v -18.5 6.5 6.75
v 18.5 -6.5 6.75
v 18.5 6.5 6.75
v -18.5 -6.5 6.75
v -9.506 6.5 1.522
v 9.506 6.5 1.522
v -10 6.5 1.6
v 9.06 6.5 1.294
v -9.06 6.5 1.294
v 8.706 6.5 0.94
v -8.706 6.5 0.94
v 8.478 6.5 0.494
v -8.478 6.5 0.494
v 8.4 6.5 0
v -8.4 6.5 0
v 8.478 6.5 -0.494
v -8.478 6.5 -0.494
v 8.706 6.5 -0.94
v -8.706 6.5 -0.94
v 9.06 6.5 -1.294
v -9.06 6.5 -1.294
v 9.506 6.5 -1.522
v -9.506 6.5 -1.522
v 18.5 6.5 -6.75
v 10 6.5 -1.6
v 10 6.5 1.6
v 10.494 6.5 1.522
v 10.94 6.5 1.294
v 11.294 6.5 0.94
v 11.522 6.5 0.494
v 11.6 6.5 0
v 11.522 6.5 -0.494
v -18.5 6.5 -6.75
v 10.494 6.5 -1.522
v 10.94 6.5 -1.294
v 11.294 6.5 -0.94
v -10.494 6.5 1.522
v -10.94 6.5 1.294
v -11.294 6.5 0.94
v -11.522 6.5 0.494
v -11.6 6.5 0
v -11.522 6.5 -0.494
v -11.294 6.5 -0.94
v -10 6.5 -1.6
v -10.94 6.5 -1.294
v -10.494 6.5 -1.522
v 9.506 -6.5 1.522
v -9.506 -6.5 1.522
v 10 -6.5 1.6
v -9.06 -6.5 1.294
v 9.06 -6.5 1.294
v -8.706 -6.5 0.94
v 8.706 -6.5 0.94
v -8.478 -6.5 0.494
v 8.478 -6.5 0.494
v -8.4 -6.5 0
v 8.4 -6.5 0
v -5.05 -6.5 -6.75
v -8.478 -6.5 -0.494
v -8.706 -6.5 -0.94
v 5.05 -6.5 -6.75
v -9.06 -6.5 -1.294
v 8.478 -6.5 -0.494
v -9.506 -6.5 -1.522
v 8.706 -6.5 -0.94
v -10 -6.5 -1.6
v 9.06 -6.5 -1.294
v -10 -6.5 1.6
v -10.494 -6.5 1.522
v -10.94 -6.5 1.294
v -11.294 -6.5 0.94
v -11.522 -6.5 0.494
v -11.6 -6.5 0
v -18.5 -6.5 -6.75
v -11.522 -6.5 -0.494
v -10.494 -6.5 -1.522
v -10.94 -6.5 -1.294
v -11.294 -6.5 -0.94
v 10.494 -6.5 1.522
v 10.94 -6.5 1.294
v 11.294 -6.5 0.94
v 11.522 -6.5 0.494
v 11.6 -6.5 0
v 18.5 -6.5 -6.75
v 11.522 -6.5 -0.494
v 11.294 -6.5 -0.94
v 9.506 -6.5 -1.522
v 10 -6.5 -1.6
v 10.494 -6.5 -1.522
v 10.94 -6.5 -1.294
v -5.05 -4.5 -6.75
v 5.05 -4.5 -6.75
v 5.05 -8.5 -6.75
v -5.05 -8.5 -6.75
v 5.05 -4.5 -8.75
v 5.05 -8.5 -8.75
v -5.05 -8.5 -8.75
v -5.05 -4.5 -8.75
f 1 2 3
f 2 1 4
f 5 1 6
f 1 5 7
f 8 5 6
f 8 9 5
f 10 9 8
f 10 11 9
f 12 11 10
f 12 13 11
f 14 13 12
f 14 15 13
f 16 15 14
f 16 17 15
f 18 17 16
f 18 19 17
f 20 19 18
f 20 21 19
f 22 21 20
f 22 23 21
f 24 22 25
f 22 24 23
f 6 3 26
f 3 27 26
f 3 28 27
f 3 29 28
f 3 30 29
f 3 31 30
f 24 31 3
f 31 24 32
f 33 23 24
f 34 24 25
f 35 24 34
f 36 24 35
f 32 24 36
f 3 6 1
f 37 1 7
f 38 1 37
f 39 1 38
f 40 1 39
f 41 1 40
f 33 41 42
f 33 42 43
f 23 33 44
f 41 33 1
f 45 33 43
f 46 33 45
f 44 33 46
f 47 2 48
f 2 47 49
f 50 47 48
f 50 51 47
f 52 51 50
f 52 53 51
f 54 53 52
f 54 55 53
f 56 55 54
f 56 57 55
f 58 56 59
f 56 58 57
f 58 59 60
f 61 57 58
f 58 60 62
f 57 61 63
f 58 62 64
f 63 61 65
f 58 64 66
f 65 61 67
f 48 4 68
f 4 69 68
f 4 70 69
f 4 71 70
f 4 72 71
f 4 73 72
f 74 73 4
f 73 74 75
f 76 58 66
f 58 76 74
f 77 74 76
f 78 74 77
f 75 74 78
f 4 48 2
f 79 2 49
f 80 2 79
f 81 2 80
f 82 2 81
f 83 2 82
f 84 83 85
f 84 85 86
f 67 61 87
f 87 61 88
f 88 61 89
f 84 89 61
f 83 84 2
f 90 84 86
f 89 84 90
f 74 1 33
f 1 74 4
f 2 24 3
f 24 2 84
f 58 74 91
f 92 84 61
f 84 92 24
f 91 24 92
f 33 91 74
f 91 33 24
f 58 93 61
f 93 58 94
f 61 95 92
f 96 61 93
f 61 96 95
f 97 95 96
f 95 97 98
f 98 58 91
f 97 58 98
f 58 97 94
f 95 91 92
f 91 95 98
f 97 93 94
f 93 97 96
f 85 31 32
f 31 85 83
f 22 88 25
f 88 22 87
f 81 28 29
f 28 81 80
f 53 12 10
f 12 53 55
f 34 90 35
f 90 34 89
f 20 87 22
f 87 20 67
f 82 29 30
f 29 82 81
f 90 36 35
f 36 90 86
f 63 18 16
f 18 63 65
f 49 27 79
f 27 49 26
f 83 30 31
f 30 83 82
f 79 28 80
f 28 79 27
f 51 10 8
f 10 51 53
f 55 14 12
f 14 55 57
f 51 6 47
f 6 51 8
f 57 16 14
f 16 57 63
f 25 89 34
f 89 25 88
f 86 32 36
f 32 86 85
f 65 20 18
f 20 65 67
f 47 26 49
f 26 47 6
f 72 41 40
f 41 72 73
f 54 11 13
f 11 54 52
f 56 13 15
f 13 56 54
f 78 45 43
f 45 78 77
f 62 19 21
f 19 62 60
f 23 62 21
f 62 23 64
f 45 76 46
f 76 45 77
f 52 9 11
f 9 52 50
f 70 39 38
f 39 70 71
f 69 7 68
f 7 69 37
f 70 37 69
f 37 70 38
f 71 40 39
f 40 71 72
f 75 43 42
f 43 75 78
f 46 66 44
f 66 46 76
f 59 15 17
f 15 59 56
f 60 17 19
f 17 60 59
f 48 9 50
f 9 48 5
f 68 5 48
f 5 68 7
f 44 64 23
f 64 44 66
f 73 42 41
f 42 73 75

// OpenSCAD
// Sharp GP2Y0A21YK0F Distance Sensor Model
// Units: mm

// --- Parameters ---
body_width = 29.5;
total_width = 37.0;
body_depth = 13.0; // Estimated from side view
total_height = 13.5;
pwb_thickness = 1.2;
hole_dist = 20.0;
hole_dia = 3.2;
lens_case_width = 6.3;
lens_dist = 12.0; // Estimated distance between lens centers
connector_width = 10.1;

// Coordinate adjustment: Center of the body is origin
// Z-axis: PWB surface is at -total_height/2
z_offset = total_height / 2;

module gp2y0a21yk0f() {
    difference() {
        union() {
            // Main Body Case
            translate([0, 0, z_offset - (total_height - pwb_thickness)/2])
                cube([body_width, body_depth, total_height - pwb_thickness], center=true);
            
            // Mounting Ears (Tabs)
            translate([-(total_width/2 - (total_width-body_width)/4), 0, z_offset - (total_height - pwb_thickness)/2])
                cube([(total_width - body_width)/2, body_depth, total_height - pwb_thickness], center=true);
            
            translate([(total_width/2 - (total_width-body_width)/4), 0, z_offset - (total_height - pwb_thickness)/2])
                cube([(total_width - body_width)/2, body_depth, total_height - pwb_thickness], center=true);
            
            // PWB (Base Plate)
            translate([0, 0, -z_offset + pwb_thickness/2])
                cube([total_width, body_depth, pwb_thickness], center=true);
                
            // Lens Cases (Protrusions at the front)
            // Based on top view, lenses are placed symmetrically
            translate([lens_dist/2, body_depth/2 - 3.15, z_offset - (total_height - pwb_thickness)/2 + 2])
                cube([lens_case_width, 6.3, 8.0], center=true);
                
            translate([-lens_dist/2, body_depth/2 - 3.15, z_offset - (total_height - pwb_thickness)/2 + 2])
                cube([lens_case_width, 6.3, 8.0], center=true);
            
            // Connector (simplified)
            translate([0, -body_depth/2, -z_offset - 1.0])
                cube([connector_width, 4.0, 2.0], center=true);
        }
        
        // Mounting Holes
        translate([hole_dist/2, 0, 0])
            rotate([90, 0, 0])
                cylinder(d=hole_dia, h=total_width, center=true, $fn=20);
                
        translate([-hole_dist/2, 0, 0])
            rotate([90, 0, 0])
                cylinder(d=hole_dia, h=total_width, center=true, $fn=20);
    }
}

// Execute modeling
gp2y0a21yk0f();

// Reference markers (optional, for verification)
%translate([0,0,-z_offset]) cube([total_width, body_depth, 0.1], center=true); // Mounting Plane
